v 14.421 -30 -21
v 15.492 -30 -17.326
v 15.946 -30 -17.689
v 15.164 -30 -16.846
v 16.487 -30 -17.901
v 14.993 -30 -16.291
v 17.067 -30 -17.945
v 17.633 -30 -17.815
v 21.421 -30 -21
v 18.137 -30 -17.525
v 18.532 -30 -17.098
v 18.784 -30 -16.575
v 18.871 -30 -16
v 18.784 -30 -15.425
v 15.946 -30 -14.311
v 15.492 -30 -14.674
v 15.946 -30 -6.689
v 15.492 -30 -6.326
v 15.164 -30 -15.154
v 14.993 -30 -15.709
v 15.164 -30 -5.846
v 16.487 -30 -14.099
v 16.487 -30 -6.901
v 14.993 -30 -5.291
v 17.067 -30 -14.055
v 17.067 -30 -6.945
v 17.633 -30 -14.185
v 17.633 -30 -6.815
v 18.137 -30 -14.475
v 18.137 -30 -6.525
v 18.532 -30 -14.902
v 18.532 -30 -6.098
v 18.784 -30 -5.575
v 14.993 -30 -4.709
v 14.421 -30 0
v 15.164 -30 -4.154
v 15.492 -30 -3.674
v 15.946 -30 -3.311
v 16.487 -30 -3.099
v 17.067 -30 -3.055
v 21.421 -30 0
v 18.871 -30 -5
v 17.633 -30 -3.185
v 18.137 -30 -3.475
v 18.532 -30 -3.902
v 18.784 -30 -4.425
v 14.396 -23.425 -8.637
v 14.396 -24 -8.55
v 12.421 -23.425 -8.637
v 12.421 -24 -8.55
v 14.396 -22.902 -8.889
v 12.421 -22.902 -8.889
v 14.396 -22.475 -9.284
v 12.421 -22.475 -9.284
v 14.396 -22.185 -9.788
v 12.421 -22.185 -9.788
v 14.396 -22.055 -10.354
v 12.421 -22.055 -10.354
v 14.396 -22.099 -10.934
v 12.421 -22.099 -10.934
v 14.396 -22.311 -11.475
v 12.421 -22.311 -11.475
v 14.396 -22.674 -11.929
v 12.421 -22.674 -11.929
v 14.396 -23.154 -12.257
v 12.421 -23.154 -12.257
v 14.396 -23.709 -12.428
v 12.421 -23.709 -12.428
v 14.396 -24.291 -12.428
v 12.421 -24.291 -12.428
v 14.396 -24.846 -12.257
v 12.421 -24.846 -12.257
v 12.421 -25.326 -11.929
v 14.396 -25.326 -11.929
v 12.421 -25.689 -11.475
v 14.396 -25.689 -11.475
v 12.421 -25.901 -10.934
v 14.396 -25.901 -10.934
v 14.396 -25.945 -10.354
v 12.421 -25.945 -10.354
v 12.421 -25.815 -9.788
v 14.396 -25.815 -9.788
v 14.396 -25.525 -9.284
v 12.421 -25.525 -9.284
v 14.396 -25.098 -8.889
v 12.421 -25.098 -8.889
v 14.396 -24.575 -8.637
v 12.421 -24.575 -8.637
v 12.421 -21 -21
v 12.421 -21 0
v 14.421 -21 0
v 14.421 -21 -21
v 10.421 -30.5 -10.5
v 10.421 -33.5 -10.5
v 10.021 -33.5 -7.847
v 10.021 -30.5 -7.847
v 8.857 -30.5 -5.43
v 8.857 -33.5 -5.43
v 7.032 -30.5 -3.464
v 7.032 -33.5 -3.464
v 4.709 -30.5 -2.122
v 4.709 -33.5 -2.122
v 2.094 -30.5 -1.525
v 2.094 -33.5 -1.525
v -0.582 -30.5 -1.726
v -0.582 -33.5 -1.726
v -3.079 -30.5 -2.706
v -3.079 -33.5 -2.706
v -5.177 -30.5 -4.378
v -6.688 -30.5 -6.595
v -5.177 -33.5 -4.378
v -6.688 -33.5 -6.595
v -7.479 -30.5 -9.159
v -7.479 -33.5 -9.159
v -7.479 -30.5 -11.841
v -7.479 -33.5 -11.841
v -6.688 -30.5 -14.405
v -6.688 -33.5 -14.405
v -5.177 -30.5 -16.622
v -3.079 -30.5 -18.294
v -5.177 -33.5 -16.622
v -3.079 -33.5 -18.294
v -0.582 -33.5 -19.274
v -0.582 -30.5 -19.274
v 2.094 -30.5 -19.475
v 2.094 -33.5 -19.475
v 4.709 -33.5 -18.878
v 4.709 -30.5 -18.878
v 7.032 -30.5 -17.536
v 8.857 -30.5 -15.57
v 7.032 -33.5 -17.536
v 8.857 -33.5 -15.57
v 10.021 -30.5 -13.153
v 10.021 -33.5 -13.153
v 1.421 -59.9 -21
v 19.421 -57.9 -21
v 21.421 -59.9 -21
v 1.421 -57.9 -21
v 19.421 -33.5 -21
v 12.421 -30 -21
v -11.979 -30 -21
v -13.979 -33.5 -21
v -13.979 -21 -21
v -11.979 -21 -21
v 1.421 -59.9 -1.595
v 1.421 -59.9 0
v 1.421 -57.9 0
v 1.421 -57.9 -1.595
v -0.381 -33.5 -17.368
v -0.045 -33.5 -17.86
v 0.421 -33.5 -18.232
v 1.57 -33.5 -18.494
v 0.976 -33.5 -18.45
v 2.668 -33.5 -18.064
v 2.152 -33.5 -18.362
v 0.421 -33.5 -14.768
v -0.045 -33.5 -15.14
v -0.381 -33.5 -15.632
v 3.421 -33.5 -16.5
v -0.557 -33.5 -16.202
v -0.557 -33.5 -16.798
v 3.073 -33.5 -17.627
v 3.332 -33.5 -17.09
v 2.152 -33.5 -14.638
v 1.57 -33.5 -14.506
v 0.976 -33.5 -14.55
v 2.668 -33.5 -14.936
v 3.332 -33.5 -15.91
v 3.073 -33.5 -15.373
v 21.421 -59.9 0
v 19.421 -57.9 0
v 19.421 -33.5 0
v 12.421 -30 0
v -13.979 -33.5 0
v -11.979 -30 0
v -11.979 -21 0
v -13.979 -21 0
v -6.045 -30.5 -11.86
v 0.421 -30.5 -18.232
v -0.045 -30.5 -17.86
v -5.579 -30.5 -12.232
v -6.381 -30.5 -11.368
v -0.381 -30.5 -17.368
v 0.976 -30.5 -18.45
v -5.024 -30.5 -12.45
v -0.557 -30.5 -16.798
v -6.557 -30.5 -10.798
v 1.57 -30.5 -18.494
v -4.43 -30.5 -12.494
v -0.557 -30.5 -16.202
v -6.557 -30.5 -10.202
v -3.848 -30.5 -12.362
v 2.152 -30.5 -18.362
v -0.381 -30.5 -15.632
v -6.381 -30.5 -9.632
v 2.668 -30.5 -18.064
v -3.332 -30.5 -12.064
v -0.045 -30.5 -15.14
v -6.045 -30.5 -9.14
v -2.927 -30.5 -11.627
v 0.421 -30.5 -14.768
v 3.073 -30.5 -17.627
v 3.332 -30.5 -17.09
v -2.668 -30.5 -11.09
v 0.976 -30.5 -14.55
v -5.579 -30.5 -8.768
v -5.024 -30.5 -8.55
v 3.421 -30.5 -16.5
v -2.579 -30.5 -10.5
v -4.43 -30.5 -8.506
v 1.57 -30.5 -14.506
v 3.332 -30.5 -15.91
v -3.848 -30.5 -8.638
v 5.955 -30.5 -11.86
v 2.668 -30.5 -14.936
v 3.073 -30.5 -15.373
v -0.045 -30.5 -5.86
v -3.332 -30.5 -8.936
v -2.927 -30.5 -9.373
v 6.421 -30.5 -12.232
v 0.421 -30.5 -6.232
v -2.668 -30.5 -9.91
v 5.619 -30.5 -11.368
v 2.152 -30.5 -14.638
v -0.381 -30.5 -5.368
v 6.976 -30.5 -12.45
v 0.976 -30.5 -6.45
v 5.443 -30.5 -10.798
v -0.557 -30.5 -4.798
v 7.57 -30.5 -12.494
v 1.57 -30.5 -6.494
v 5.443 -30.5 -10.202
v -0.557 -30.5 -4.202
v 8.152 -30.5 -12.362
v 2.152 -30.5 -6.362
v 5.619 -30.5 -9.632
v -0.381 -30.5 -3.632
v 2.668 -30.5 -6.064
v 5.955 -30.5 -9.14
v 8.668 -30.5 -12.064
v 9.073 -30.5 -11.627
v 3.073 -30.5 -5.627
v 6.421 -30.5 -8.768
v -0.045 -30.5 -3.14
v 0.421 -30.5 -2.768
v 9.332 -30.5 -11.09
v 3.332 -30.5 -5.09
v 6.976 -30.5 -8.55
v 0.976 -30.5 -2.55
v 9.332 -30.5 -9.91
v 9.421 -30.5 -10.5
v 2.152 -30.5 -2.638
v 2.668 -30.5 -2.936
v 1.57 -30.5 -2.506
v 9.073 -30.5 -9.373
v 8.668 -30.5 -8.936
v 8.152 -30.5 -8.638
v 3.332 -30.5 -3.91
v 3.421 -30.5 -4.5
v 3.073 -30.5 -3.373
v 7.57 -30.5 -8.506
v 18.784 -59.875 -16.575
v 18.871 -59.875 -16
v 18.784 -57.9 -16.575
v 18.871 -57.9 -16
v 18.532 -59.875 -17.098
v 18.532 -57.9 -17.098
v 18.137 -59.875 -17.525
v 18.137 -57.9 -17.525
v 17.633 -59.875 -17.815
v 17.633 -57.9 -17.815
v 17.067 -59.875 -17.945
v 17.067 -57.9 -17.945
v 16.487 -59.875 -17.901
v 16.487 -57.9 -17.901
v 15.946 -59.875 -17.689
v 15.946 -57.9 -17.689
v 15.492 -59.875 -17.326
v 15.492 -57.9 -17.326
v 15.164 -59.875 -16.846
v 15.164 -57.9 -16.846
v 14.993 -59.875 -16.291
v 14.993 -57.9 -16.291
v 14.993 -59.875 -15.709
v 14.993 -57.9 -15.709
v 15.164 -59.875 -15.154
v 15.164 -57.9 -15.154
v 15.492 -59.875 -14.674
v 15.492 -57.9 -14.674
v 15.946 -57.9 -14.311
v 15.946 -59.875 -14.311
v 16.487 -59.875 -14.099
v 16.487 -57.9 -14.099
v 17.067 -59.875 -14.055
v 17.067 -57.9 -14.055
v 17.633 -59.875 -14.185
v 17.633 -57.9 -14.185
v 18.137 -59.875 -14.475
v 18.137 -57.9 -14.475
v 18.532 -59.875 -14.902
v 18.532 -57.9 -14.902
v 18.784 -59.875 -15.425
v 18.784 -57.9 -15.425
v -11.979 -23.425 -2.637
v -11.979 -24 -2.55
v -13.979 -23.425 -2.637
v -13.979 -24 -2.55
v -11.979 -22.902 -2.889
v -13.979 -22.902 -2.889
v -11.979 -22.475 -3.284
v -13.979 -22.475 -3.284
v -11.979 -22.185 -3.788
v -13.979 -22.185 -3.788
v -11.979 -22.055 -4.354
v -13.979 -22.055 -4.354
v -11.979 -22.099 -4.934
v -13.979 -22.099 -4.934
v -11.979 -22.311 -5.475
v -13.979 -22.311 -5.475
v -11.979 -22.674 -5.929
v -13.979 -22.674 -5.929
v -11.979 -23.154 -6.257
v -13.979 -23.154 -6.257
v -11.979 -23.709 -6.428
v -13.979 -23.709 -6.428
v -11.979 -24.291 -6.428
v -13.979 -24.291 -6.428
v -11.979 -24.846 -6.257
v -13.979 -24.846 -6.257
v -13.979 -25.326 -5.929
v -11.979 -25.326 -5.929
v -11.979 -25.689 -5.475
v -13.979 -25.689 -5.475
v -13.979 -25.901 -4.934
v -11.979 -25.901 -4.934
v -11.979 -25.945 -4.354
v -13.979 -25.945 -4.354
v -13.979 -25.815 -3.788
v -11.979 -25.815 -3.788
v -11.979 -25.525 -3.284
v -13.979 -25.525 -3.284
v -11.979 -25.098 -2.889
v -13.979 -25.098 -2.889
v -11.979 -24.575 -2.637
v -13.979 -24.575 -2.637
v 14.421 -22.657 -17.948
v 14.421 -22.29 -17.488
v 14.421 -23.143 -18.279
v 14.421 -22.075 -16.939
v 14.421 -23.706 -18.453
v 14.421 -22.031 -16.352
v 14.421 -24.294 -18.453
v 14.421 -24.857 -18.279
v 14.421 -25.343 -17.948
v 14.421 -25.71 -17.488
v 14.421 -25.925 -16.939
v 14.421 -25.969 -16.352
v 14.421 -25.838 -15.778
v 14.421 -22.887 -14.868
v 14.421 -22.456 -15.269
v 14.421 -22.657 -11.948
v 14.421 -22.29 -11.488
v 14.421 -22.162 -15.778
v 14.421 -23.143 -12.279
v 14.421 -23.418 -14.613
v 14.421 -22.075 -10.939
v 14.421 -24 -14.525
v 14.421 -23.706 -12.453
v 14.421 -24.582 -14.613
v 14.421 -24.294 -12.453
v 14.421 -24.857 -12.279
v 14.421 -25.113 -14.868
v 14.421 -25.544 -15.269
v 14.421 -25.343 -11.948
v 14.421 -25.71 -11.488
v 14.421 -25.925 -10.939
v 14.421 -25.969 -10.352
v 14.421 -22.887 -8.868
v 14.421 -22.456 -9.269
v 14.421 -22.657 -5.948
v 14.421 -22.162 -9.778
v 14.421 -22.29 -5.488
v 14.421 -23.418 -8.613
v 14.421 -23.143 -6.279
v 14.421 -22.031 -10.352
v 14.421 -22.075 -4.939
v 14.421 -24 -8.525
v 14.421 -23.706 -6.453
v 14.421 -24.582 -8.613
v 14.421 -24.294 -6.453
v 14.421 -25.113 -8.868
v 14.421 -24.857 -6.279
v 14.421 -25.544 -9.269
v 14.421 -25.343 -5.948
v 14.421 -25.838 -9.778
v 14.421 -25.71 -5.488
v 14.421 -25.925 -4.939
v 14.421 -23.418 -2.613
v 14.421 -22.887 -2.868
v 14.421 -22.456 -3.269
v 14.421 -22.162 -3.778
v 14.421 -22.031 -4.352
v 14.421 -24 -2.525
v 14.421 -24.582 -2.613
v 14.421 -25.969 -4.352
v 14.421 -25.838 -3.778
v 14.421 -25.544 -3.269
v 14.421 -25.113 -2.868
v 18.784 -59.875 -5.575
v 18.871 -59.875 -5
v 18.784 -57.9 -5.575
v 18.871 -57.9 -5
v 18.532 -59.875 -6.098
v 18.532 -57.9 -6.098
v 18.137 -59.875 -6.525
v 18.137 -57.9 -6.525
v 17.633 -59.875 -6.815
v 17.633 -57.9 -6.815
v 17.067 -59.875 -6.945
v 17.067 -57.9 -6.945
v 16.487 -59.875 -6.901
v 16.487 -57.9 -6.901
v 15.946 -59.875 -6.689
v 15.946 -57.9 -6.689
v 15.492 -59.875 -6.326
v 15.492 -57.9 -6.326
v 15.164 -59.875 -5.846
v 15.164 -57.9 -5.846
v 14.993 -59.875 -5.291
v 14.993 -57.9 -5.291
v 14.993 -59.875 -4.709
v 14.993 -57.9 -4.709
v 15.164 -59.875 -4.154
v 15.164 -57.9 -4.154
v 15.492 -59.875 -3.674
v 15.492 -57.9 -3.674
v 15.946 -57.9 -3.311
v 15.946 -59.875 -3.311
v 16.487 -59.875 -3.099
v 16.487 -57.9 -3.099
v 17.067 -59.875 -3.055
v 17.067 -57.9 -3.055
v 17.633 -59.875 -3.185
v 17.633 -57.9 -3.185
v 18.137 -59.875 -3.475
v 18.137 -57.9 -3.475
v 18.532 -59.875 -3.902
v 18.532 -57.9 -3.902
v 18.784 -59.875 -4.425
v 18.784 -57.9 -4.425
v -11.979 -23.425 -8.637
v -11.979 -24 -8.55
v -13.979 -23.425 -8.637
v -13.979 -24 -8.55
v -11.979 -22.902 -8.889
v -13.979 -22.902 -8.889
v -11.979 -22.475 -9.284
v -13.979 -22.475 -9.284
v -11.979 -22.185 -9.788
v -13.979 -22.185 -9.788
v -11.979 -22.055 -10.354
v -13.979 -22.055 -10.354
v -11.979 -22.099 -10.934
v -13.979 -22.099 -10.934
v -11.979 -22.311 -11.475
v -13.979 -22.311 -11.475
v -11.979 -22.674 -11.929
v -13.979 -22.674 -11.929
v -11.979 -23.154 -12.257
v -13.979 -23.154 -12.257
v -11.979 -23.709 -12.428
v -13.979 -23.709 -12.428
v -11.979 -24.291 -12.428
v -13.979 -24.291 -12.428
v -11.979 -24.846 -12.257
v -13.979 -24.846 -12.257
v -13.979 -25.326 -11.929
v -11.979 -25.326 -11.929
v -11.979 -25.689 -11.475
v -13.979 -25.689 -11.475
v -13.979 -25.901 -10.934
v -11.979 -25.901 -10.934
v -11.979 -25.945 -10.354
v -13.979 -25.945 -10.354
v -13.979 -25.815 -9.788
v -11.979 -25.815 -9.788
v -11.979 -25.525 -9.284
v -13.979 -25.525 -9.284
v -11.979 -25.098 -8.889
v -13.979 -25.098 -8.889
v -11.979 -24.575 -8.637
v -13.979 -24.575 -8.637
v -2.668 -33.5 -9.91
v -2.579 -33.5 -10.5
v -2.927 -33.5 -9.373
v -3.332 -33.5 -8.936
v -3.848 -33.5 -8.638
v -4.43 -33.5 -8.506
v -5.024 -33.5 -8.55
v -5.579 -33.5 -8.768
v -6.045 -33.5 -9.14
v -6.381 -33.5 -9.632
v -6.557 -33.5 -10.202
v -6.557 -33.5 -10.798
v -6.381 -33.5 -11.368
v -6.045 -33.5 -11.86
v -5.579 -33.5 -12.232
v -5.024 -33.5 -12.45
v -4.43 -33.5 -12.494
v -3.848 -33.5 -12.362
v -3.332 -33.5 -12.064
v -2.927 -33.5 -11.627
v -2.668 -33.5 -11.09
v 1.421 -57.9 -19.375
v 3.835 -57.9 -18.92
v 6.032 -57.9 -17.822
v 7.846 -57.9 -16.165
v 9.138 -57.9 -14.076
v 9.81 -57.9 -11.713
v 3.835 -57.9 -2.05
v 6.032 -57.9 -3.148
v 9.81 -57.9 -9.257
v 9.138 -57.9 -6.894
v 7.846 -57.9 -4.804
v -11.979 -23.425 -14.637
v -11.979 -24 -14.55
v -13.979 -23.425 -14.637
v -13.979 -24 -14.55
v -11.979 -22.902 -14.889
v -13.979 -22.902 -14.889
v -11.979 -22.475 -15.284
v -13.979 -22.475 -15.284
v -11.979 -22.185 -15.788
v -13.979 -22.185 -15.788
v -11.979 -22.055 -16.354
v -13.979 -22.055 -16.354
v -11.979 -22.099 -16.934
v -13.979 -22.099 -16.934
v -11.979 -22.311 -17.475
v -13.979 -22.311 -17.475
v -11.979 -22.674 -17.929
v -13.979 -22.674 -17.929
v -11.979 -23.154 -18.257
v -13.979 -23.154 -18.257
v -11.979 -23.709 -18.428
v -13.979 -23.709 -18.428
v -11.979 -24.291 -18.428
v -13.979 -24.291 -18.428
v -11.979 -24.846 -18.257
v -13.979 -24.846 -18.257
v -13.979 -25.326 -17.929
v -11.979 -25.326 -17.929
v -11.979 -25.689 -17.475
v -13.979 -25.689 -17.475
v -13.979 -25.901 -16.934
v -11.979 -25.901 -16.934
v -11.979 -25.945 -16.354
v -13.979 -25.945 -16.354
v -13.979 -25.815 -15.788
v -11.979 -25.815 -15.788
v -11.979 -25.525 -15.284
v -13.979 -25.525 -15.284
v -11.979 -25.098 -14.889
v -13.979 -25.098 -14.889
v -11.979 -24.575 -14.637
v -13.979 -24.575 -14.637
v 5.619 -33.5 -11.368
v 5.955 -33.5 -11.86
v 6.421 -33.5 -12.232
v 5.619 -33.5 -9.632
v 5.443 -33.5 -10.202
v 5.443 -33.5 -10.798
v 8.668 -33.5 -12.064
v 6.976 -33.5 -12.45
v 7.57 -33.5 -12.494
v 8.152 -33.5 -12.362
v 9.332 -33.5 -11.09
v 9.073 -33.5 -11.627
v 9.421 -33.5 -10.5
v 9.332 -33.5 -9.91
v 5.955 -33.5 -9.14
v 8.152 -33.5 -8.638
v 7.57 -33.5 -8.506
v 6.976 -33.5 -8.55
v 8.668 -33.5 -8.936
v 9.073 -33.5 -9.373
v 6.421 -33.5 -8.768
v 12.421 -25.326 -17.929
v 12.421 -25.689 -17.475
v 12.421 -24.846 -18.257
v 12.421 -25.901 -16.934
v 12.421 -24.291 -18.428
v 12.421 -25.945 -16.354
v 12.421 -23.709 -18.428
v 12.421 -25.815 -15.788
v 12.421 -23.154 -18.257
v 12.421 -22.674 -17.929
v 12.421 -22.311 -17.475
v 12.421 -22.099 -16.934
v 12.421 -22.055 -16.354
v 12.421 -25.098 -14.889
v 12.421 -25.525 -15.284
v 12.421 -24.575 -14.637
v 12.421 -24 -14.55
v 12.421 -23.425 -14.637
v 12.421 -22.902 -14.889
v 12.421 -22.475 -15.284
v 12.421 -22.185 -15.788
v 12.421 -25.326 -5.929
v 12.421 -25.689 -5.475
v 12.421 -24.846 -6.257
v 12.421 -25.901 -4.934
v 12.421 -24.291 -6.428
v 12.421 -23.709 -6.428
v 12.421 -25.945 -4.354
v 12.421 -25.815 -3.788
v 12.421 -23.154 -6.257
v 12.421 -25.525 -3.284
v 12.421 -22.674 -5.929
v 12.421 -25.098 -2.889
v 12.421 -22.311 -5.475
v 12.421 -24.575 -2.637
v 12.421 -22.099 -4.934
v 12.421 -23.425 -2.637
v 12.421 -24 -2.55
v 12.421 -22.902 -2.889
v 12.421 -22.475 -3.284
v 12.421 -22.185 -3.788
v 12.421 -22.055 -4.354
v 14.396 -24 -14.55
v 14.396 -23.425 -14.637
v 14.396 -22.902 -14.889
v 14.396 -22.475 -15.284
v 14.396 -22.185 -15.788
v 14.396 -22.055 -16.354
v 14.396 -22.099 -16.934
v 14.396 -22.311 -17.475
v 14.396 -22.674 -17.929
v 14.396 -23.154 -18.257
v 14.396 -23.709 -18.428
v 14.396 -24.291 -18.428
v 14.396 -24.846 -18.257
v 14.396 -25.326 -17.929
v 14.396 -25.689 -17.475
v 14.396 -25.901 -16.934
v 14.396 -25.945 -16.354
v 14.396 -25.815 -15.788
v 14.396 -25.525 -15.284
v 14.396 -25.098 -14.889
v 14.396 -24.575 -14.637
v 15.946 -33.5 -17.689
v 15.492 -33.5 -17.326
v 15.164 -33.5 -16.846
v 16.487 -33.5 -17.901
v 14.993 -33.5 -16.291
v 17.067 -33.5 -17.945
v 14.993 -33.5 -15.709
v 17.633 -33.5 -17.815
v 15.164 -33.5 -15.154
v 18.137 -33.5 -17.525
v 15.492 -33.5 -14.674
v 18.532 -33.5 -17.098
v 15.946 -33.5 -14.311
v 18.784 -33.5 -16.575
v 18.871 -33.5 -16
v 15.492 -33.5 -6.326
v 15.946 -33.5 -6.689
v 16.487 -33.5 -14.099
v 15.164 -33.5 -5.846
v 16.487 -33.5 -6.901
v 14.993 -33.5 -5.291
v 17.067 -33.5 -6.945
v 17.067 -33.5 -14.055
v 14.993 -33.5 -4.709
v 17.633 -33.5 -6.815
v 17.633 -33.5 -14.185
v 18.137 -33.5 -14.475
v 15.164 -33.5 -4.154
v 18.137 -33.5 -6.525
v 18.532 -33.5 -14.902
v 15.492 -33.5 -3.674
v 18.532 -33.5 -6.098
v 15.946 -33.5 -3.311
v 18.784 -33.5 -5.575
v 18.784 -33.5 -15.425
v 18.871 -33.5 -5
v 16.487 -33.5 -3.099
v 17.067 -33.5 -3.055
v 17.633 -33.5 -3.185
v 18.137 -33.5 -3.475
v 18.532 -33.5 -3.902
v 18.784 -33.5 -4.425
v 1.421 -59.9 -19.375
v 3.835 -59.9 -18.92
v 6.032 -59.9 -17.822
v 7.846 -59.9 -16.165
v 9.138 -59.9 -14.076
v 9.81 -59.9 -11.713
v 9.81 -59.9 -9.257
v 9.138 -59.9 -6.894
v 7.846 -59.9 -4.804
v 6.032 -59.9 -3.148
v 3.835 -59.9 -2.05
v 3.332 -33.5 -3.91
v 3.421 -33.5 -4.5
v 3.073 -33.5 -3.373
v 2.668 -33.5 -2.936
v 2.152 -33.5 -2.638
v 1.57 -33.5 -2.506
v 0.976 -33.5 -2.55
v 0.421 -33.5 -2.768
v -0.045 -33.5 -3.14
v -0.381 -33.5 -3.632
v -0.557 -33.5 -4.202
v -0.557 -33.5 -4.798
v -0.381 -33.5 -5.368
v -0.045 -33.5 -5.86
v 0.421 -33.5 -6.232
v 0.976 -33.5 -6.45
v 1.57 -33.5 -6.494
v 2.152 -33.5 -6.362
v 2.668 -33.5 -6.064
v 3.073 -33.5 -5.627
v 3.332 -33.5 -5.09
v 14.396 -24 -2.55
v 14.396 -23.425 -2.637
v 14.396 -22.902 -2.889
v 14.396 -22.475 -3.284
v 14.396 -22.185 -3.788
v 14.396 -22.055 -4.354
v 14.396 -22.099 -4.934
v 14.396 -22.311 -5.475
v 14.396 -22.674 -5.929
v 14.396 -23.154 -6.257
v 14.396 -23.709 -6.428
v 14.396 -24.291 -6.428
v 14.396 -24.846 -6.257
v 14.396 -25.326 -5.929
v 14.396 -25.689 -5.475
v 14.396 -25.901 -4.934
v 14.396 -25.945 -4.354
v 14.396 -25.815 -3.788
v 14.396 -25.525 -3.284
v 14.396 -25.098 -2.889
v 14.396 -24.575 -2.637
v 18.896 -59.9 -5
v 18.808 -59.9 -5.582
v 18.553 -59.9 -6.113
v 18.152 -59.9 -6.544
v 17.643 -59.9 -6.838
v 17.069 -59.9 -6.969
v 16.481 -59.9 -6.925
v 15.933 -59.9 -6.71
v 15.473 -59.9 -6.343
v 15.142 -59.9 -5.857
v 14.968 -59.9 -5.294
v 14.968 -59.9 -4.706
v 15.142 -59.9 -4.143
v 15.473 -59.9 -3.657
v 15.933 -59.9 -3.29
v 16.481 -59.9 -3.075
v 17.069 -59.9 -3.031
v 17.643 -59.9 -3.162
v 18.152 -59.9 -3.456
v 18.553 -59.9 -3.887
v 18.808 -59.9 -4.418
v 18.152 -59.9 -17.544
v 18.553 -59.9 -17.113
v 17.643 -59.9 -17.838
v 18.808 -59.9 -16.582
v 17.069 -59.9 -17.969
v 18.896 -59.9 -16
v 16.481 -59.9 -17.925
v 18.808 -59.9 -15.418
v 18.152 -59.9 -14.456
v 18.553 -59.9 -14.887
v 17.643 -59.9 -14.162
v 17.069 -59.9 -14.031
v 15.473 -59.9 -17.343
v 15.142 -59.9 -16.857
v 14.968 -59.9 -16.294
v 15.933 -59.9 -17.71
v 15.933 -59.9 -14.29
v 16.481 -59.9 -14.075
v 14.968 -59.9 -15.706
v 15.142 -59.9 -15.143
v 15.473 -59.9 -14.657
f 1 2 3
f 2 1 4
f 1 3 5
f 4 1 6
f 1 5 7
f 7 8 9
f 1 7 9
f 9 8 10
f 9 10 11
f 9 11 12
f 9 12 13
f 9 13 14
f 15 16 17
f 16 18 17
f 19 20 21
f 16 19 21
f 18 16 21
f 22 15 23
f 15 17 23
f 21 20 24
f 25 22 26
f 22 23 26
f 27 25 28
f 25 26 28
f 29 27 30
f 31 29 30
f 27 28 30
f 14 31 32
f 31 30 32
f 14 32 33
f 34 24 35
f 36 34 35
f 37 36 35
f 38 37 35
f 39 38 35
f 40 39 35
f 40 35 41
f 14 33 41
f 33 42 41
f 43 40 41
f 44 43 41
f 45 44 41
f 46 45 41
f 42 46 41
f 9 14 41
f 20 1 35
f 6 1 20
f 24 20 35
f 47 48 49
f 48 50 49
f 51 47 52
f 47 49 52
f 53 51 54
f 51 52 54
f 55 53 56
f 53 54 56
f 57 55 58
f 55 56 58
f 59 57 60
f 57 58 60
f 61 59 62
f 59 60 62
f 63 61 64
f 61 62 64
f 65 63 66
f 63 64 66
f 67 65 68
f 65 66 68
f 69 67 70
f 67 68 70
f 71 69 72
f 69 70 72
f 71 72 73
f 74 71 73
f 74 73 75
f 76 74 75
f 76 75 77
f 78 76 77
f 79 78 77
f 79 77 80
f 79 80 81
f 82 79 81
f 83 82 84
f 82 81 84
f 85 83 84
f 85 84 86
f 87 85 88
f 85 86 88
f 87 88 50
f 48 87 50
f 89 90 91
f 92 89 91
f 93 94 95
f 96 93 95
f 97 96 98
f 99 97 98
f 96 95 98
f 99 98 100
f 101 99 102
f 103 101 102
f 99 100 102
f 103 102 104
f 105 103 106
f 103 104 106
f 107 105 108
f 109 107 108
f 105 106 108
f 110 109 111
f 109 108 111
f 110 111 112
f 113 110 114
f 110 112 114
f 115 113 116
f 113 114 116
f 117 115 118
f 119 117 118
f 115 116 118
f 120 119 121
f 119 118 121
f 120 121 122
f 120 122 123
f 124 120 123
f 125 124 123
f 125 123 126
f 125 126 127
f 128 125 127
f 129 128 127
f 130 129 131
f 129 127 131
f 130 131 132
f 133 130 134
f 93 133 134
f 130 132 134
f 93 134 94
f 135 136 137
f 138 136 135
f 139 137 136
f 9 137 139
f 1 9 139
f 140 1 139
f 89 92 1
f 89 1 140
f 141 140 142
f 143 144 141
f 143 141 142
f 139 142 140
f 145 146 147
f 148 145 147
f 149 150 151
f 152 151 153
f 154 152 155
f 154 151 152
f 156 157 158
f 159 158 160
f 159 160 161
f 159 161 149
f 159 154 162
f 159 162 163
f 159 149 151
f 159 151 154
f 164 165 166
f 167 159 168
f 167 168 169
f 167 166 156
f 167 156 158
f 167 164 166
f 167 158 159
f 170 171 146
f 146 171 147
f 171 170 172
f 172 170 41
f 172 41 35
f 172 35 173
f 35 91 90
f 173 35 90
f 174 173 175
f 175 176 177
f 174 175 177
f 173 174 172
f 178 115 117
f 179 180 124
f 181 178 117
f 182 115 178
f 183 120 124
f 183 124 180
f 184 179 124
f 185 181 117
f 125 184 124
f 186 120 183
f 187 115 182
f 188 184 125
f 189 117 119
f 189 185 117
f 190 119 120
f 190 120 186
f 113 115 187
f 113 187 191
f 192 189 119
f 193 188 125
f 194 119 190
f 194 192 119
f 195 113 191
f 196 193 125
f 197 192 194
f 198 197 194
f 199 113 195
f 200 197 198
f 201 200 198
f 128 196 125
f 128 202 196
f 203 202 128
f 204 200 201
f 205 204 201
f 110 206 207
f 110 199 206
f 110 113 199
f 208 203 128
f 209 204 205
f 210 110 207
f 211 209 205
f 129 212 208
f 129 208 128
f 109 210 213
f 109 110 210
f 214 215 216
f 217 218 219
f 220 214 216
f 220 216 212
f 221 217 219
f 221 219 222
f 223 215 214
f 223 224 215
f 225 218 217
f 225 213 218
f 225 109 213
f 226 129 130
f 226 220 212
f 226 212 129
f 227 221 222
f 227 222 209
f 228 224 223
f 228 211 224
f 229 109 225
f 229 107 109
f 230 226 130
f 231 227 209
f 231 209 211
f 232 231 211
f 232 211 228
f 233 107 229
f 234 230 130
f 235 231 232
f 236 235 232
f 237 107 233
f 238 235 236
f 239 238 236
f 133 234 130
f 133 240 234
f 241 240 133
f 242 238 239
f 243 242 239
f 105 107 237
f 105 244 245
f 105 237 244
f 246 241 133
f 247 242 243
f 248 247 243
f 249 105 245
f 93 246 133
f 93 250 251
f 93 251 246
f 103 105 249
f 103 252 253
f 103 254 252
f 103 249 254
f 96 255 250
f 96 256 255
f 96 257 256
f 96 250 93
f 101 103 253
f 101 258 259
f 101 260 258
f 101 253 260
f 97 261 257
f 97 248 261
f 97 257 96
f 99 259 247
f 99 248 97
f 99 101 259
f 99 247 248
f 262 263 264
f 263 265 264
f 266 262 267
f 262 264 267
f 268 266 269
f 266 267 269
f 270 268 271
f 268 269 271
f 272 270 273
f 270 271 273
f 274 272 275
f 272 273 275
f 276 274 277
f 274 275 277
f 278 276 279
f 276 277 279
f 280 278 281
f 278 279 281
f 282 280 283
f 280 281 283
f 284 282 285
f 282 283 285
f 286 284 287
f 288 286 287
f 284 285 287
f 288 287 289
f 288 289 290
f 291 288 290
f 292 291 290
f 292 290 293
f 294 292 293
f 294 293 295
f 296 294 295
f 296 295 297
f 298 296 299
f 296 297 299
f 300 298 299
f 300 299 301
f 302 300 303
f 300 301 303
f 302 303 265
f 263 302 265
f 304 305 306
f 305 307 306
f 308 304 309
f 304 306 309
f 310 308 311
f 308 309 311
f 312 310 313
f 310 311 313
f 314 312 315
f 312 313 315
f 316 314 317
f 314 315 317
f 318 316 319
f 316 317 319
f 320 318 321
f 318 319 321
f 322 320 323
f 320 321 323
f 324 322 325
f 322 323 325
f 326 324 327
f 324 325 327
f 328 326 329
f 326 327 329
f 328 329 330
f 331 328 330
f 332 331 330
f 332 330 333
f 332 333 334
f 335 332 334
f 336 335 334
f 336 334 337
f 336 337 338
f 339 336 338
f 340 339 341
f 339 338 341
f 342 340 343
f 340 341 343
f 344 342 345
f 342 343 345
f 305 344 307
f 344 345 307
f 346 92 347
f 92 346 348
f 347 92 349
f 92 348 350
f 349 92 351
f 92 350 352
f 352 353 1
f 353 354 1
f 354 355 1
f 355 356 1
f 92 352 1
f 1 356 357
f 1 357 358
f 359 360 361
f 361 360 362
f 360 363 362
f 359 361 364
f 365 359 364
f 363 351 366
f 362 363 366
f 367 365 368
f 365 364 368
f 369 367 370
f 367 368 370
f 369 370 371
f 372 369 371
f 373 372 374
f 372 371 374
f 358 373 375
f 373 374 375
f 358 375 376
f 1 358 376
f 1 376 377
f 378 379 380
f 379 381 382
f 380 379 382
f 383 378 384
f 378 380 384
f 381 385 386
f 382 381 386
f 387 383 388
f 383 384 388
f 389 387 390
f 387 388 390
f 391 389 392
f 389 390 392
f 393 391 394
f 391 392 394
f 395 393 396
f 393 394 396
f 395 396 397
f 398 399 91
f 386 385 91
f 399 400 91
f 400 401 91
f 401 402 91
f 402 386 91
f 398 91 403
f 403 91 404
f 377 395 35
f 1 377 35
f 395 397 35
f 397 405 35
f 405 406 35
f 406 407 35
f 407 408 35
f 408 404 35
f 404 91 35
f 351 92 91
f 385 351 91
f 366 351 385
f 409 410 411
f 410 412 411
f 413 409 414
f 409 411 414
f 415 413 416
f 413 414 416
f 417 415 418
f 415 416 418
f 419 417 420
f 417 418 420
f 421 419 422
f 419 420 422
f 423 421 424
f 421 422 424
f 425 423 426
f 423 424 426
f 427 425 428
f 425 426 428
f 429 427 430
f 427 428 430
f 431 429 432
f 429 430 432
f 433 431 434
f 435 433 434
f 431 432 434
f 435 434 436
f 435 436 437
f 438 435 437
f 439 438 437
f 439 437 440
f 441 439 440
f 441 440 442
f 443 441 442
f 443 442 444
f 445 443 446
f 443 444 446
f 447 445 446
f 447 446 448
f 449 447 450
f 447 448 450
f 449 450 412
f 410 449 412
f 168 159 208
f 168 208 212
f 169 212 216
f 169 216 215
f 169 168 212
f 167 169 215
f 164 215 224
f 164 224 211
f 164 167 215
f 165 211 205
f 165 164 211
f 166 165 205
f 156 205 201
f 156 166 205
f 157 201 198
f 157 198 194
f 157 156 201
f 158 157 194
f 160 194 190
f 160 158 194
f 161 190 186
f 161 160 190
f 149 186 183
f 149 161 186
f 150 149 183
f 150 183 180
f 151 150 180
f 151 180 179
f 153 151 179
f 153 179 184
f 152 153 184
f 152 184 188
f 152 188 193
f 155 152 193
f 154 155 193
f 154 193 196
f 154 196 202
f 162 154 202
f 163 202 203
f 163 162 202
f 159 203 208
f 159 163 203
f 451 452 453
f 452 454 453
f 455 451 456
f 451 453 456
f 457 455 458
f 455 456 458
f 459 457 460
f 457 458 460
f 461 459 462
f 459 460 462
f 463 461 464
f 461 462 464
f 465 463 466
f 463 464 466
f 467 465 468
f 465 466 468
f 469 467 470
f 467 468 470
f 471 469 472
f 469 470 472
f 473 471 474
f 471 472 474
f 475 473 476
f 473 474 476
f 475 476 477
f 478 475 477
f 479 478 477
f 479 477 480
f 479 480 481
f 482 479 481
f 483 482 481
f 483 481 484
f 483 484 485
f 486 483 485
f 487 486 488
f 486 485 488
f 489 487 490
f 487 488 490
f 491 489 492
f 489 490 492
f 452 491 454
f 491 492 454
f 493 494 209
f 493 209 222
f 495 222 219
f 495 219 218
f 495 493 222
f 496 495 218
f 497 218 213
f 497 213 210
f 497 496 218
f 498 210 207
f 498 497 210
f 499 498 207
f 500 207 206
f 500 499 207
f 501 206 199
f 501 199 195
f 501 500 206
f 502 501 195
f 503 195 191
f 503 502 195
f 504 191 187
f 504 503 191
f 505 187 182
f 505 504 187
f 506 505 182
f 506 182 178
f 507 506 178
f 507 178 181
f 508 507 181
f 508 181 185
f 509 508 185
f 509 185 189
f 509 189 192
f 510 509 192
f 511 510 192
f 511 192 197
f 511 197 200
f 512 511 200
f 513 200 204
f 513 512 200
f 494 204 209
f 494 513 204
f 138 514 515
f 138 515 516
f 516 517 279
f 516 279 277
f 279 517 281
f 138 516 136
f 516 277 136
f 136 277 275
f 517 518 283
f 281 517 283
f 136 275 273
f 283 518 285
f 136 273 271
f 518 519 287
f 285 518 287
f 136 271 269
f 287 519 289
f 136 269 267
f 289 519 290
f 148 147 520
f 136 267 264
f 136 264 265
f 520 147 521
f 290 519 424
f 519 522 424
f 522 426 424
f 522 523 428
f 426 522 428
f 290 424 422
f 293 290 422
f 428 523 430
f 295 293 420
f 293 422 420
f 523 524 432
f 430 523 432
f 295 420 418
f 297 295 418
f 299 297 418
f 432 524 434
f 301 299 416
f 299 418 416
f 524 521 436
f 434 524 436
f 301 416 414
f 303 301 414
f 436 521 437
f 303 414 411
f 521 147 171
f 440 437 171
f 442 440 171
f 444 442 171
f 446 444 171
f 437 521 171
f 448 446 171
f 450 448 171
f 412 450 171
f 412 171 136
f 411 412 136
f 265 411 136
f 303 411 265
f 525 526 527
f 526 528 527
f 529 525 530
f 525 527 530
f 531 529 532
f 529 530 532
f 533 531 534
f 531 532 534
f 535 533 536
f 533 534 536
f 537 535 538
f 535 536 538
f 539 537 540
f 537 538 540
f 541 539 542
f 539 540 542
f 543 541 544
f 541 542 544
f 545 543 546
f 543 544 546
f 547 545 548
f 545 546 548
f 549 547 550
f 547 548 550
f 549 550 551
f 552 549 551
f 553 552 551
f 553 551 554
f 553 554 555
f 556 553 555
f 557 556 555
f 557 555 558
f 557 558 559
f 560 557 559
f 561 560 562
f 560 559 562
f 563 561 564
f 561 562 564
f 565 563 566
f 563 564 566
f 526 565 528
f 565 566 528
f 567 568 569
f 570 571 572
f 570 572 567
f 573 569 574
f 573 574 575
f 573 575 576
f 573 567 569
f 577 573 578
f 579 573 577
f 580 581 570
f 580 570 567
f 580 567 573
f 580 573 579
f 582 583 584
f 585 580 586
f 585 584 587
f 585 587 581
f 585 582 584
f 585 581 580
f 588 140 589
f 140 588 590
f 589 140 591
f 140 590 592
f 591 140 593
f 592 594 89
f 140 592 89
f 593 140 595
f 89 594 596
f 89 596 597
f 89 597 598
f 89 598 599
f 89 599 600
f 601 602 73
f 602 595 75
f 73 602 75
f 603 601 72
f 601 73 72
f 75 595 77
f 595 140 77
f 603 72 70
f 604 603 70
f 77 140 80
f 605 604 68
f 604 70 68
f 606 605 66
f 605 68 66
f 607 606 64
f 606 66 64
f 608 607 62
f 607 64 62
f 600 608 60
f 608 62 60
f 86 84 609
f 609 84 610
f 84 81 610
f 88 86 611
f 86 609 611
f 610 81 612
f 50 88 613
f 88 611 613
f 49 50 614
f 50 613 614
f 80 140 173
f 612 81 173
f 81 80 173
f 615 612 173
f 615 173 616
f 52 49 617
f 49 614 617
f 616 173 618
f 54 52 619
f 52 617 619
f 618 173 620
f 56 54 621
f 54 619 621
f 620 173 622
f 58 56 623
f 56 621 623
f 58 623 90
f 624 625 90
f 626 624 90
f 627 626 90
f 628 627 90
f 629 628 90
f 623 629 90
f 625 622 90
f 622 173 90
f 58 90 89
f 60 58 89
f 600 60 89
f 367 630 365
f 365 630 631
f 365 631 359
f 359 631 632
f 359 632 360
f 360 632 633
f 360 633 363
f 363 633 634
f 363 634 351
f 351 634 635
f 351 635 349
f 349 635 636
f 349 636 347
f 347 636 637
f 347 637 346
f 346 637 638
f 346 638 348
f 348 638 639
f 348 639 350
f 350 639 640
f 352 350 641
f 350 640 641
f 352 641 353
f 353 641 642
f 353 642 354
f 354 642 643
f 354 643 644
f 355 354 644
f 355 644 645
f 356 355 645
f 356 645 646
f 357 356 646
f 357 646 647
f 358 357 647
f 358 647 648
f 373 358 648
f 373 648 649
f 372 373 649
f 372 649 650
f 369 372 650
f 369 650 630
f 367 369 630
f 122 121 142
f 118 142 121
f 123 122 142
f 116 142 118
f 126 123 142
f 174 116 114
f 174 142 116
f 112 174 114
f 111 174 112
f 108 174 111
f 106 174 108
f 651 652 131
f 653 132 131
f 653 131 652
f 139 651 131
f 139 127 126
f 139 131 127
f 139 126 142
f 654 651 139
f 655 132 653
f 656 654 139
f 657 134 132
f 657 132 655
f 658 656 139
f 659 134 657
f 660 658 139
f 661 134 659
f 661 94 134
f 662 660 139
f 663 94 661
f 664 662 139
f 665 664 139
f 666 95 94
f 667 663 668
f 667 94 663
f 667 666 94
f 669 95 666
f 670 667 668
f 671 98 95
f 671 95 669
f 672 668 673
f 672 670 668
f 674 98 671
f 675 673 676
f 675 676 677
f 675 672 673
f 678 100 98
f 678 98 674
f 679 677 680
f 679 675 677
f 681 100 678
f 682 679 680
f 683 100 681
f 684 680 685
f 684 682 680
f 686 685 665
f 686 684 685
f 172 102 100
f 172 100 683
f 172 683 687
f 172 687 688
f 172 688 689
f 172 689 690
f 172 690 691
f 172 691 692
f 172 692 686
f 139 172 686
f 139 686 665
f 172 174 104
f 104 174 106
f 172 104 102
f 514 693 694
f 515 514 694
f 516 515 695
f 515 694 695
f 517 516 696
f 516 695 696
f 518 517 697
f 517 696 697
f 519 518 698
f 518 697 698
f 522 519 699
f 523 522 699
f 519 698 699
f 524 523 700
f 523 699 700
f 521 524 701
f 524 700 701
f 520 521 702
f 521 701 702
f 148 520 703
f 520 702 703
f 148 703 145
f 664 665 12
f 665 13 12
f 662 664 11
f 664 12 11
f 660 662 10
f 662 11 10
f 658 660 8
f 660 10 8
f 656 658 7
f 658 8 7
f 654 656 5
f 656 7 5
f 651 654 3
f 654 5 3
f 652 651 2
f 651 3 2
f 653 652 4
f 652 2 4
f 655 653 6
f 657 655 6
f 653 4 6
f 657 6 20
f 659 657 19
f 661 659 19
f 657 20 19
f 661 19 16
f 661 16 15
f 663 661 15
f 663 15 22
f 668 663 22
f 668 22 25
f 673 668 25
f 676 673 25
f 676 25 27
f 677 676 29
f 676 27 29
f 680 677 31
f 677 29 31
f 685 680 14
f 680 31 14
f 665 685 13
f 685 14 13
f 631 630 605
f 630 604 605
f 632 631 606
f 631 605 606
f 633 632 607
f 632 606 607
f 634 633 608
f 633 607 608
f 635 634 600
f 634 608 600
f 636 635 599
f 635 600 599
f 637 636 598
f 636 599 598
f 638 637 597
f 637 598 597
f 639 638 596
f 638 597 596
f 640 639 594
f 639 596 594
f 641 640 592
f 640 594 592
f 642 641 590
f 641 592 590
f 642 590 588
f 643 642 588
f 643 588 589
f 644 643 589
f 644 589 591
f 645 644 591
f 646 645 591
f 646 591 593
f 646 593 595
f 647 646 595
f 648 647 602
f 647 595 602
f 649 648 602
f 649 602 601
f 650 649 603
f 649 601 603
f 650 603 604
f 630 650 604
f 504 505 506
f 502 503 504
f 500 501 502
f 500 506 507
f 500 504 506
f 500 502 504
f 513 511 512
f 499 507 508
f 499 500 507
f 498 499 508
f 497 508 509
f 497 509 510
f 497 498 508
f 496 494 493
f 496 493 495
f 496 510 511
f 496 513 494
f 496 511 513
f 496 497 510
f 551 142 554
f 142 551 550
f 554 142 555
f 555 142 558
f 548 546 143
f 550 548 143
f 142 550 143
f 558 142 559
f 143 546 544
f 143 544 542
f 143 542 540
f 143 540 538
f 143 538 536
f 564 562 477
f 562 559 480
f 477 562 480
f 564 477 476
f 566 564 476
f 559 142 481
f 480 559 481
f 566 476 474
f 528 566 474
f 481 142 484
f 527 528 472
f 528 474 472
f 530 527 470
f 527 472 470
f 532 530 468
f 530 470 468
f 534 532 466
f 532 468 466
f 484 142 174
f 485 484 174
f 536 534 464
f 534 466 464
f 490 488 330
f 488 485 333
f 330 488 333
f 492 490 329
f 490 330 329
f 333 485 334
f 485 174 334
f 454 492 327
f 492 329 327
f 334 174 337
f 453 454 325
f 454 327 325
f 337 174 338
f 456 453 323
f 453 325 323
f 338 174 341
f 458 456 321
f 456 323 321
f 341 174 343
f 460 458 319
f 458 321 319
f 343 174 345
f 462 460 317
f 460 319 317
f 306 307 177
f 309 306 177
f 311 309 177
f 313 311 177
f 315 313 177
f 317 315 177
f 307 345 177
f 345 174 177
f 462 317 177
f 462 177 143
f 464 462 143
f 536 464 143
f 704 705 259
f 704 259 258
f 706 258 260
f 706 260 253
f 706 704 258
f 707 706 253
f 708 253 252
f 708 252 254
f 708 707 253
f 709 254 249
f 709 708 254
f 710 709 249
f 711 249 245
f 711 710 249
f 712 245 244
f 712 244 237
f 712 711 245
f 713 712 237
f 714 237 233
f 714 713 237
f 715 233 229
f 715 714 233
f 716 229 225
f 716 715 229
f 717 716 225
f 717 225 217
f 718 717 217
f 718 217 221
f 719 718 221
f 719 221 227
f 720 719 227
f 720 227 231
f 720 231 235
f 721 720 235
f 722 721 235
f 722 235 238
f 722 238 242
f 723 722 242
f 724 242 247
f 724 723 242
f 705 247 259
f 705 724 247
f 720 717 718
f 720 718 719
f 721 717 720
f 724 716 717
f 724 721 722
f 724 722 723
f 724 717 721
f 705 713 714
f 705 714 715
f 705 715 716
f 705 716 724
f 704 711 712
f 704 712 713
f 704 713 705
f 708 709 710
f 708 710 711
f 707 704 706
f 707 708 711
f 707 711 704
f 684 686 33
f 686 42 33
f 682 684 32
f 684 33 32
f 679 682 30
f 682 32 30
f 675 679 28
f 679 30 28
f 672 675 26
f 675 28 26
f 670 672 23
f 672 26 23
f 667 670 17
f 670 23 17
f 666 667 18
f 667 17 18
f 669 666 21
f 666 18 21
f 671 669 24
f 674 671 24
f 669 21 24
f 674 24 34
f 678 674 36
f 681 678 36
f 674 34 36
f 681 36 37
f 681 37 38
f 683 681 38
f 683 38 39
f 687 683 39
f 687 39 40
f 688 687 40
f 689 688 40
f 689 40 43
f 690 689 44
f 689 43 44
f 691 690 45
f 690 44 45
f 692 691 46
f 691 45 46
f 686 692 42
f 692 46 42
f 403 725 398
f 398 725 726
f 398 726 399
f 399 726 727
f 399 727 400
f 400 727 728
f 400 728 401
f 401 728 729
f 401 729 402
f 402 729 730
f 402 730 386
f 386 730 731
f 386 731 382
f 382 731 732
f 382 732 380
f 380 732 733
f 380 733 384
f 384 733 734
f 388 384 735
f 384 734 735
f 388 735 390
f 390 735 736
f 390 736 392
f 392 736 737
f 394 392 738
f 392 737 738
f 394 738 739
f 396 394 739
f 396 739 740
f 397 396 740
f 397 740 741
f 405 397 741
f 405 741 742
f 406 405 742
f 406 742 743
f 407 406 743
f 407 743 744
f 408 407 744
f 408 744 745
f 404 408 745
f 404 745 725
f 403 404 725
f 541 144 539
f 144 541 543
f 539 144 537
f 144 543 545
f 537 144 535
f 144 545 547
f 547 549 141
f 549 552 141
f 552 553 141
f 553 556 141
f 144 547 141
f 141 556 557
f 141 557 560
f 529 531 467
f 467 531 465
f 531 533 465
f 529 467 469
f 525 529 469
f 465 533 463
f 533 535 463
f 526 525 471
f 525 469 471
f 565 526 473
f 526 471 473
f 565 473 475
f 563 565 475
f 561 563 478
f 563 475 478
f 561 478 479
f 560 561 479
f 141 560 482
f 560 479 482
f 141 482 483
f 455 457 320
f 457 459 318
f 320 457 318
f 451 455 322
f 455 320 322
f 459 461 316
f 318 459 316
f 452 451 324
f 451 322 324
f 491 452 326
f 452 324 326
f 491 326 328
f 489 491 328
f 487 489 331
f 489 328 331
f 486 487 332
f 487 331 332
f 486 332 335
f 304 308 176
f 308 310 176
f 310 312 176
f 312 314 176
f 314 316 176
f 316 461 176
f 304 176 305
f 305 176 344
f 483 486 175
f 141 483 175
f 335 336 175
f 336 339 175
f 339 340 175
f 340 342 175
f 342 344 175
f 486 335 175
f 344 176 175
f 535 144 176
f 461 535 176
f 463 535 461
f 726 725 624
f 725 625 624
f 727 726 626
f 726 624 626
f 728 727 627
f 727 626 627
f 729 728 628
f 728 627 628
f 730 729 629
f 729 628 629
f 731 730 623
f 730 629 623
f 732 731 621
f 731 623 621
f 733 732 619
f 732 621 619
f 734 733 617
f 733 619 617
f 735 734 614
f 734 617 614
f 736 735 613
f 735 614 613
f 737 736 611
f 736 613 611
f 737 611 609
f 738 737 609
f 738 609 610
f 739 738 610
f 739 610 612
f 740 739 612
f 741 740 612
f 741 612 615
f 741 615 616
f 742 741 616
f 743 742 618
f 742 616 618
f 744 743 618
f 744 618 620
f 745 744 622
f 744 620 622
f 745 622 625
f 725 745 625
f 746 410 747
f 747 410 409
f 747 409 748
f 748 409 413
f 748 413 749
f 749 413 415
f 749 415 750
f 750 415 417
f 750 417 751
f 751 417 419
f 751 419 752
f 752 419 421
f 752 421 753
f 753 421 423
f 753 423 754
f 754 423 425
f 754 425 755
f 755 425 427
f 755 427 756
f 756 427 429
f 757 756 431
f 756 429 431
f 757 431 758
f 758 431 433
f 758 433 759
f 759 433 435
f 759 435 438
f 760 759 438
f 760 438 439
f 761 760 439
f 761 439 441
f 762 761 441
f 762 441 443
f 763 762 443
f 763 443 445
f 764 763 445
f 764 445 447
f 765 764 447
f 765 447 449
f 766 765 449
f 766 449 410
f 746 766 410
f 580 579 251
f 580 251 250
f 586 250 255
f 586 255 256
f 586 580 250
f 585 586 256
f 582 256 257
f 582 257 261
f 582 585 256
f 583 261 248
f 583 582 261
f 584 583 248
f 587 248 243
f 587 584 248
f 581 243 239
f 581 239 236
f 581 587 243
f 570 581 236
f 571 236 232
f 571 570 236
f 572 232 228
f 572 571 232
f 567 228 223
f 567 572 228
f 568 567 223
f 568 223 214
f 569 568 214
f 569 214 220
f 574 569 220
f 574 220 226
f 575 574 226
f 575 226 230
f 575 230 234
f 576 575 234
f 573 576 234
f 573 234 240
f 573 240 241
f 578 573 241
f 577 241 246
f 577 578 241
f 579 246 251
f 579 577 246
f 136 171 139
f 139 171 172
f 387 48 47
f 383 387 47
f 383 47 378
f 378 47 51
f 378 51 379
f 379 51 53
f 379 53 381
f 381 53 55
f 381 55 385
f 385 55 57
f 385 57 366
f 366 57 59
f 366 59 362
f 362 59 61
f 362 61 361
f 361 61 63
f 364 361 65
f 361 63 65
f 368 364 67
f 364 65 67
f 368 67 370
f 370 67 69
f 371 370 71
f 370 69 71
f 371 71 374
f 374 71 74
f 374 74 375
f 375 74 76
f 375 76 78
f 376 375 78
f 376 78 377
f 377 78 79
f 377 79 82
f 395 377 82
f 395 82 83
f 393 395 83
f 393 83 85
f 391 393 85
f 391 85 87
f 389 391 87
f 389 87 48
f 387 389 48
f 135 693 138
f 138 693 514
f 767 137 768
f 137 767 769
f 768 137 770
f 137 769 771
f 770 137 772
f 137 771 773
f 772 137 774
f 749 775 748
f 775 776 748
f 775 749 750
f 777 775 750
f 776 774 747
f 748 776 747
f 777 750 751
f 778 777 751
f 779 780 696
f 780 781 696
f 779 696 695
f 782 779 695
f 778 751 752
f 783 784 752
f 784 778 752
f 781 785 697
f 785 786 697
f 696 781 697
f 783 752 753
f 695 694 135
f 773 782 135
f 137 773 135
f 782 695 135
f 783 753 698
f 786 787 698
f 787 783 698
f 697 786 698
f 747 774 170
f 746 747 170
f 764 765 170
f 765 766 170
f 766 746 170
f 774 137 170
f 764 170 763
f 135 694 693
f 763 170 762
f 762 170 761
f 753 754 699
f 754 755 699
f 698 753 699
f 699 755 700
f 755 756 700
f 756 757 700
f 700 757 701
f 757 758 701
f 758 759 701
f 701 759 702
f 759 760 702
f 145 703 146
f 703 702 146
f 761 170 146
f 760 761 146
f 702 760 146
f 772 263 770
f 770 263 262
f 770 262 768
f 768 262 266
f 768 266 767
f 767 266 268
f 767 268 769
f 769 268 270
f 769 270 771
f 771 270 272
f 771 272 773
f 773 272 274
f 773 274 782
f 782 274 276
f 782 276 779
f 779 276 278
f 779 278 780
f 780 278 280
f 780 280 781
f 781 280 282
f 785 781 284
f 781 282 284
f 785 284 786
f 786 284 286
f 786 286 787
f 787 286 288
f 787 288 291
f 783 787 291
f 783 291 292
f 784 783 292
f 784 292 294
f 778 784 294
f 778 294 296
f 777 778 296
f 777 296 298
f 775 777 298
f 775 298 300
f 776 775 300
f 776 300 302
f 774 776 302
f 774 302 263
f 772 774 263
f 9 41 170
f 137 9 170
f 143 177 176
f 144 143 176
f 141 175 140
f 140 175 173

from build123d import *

# Parameters (mm, degrees)
BOSS_EXTRUDE1_DEPTH              = 21
M3_5_CLEARANCE_HOLE1_D           = 3.9
M3_5_CLEARANCE_HOLE1_CSINK_D     = 3.95
M3_5_CLEARANCE_HOLE1_CSINK_ANGLE = 90
SKETCH4_R                        = 9
SKETCH4_R_2                      = 2
CUT_EXTRUDE1_DEPTH               = 3
SKETCH5_R                        = 8.9
CUT_EXTRUDE2_DEPTH               = 3
M3_5_CLEARANCE_HOLE2_D           = 3.9
M3_5_CLEARANCE_HOLE2_CSINK_D     = 3.95
M3_5_CLEARANCE_HOLE2_CSINK_ANGLE = 90


with BuildPart() as part:
    # Sketch1 → Boss-Extrude1 (new body)
    with BuildSketch(Plane.XY):
        Polygon((14.42095576, -30), (21.42095576, -30), (21.42095576, -59.9), (1.42095576, -59.9), (1.42095576, -57.9), (19.42095576, -57.9), (19.42095576, -33.5), (14.42095576, -33.5), (-13.97904424, -33.5), (-13.97904424, -21), (-11.97904424, -21), (-11.97904424, -30), (12.42095576, -30), (12.42095576, -21), (14.42095576, -21), align=None)
    extrude(amount=-BOSS_EXTRUDE1_DEPTH)

    # M3.5 Clearance Hole1 (through all)
    with Locations(Plane(origin=(14.42095576, 0, 0), x_dir=(0, 0, -1), z_dir=(1, 0, 0))):
        with Locations((4.5, -24), (10.5, -24), (16.5, -24)):
            CounterSinkHole(M3_5_CLEARANCE_HOLE1_D / 2, M3_5_CLEARANCE_HOLE1_CSINK_D / 2, counter_sink_angle=M3_5_CLEARANCE_HOLE1_CSINK_ANGLE)

    # Sketch4 → Cut-Extrude1 (cut)
    with BuildSketch(Plane.XZ.offset(33.5)):
        with Locations((1.42095576, -10.5)):
            Circle(SKETCH4_R)
        with Locations((1.42095576, -4.5)):
            Circle(SKETCH4_R_2, mode=Mode.SUBTRACT)
        with Locations((1.42095576, -16.5)):
            Circle(SKETCH4_R_2, mode=Mode.SUBTRACT)
        with Locations((-4.57904424, -10.5)):
            Circle(SKETCH4_R_2, mode=Mode.SUBTRACT)
        with Locations((7.42095576, -10.5)):
            Circle(SKETCH4_R_2, mode=Mode.SUBTRACT)
    extrude(amount=-CUT_EXTRUDE1_DEPTH, mode=Mode.SUBTRACT)

    # Sketch5 → Cut-Extrude2 (cut)
    with BuildSketch(Plane.XZ.offset(59.9)):
        with Locations((0.99475454, -10.484843567)):
            Circle(SKETCH5_R)
    extrude(amount=-CUT_EXTRUDE2_DEPTH, mode=Mode.SUBTRACT)

    # M3.5 Clearance Hole2 (through all)
    with Locations(Plane(origin=(0, -59.9, 0), x_dir=(-1, 0, 0), z_dir=(0, -1, 0))):
        with Locations((-16.92095576, 16), (-16.92095576, 5)):
            CounterSinkHole(M3_5_CLEARANCE_HOLE2_D / 2, M3_5_CLEARANCE_HOLE2_CSINK_D / 2, counter_sink_angle=M3_5_CLEARANCE_HOLE2_CSINK_ANGLE)


solid = part.part
